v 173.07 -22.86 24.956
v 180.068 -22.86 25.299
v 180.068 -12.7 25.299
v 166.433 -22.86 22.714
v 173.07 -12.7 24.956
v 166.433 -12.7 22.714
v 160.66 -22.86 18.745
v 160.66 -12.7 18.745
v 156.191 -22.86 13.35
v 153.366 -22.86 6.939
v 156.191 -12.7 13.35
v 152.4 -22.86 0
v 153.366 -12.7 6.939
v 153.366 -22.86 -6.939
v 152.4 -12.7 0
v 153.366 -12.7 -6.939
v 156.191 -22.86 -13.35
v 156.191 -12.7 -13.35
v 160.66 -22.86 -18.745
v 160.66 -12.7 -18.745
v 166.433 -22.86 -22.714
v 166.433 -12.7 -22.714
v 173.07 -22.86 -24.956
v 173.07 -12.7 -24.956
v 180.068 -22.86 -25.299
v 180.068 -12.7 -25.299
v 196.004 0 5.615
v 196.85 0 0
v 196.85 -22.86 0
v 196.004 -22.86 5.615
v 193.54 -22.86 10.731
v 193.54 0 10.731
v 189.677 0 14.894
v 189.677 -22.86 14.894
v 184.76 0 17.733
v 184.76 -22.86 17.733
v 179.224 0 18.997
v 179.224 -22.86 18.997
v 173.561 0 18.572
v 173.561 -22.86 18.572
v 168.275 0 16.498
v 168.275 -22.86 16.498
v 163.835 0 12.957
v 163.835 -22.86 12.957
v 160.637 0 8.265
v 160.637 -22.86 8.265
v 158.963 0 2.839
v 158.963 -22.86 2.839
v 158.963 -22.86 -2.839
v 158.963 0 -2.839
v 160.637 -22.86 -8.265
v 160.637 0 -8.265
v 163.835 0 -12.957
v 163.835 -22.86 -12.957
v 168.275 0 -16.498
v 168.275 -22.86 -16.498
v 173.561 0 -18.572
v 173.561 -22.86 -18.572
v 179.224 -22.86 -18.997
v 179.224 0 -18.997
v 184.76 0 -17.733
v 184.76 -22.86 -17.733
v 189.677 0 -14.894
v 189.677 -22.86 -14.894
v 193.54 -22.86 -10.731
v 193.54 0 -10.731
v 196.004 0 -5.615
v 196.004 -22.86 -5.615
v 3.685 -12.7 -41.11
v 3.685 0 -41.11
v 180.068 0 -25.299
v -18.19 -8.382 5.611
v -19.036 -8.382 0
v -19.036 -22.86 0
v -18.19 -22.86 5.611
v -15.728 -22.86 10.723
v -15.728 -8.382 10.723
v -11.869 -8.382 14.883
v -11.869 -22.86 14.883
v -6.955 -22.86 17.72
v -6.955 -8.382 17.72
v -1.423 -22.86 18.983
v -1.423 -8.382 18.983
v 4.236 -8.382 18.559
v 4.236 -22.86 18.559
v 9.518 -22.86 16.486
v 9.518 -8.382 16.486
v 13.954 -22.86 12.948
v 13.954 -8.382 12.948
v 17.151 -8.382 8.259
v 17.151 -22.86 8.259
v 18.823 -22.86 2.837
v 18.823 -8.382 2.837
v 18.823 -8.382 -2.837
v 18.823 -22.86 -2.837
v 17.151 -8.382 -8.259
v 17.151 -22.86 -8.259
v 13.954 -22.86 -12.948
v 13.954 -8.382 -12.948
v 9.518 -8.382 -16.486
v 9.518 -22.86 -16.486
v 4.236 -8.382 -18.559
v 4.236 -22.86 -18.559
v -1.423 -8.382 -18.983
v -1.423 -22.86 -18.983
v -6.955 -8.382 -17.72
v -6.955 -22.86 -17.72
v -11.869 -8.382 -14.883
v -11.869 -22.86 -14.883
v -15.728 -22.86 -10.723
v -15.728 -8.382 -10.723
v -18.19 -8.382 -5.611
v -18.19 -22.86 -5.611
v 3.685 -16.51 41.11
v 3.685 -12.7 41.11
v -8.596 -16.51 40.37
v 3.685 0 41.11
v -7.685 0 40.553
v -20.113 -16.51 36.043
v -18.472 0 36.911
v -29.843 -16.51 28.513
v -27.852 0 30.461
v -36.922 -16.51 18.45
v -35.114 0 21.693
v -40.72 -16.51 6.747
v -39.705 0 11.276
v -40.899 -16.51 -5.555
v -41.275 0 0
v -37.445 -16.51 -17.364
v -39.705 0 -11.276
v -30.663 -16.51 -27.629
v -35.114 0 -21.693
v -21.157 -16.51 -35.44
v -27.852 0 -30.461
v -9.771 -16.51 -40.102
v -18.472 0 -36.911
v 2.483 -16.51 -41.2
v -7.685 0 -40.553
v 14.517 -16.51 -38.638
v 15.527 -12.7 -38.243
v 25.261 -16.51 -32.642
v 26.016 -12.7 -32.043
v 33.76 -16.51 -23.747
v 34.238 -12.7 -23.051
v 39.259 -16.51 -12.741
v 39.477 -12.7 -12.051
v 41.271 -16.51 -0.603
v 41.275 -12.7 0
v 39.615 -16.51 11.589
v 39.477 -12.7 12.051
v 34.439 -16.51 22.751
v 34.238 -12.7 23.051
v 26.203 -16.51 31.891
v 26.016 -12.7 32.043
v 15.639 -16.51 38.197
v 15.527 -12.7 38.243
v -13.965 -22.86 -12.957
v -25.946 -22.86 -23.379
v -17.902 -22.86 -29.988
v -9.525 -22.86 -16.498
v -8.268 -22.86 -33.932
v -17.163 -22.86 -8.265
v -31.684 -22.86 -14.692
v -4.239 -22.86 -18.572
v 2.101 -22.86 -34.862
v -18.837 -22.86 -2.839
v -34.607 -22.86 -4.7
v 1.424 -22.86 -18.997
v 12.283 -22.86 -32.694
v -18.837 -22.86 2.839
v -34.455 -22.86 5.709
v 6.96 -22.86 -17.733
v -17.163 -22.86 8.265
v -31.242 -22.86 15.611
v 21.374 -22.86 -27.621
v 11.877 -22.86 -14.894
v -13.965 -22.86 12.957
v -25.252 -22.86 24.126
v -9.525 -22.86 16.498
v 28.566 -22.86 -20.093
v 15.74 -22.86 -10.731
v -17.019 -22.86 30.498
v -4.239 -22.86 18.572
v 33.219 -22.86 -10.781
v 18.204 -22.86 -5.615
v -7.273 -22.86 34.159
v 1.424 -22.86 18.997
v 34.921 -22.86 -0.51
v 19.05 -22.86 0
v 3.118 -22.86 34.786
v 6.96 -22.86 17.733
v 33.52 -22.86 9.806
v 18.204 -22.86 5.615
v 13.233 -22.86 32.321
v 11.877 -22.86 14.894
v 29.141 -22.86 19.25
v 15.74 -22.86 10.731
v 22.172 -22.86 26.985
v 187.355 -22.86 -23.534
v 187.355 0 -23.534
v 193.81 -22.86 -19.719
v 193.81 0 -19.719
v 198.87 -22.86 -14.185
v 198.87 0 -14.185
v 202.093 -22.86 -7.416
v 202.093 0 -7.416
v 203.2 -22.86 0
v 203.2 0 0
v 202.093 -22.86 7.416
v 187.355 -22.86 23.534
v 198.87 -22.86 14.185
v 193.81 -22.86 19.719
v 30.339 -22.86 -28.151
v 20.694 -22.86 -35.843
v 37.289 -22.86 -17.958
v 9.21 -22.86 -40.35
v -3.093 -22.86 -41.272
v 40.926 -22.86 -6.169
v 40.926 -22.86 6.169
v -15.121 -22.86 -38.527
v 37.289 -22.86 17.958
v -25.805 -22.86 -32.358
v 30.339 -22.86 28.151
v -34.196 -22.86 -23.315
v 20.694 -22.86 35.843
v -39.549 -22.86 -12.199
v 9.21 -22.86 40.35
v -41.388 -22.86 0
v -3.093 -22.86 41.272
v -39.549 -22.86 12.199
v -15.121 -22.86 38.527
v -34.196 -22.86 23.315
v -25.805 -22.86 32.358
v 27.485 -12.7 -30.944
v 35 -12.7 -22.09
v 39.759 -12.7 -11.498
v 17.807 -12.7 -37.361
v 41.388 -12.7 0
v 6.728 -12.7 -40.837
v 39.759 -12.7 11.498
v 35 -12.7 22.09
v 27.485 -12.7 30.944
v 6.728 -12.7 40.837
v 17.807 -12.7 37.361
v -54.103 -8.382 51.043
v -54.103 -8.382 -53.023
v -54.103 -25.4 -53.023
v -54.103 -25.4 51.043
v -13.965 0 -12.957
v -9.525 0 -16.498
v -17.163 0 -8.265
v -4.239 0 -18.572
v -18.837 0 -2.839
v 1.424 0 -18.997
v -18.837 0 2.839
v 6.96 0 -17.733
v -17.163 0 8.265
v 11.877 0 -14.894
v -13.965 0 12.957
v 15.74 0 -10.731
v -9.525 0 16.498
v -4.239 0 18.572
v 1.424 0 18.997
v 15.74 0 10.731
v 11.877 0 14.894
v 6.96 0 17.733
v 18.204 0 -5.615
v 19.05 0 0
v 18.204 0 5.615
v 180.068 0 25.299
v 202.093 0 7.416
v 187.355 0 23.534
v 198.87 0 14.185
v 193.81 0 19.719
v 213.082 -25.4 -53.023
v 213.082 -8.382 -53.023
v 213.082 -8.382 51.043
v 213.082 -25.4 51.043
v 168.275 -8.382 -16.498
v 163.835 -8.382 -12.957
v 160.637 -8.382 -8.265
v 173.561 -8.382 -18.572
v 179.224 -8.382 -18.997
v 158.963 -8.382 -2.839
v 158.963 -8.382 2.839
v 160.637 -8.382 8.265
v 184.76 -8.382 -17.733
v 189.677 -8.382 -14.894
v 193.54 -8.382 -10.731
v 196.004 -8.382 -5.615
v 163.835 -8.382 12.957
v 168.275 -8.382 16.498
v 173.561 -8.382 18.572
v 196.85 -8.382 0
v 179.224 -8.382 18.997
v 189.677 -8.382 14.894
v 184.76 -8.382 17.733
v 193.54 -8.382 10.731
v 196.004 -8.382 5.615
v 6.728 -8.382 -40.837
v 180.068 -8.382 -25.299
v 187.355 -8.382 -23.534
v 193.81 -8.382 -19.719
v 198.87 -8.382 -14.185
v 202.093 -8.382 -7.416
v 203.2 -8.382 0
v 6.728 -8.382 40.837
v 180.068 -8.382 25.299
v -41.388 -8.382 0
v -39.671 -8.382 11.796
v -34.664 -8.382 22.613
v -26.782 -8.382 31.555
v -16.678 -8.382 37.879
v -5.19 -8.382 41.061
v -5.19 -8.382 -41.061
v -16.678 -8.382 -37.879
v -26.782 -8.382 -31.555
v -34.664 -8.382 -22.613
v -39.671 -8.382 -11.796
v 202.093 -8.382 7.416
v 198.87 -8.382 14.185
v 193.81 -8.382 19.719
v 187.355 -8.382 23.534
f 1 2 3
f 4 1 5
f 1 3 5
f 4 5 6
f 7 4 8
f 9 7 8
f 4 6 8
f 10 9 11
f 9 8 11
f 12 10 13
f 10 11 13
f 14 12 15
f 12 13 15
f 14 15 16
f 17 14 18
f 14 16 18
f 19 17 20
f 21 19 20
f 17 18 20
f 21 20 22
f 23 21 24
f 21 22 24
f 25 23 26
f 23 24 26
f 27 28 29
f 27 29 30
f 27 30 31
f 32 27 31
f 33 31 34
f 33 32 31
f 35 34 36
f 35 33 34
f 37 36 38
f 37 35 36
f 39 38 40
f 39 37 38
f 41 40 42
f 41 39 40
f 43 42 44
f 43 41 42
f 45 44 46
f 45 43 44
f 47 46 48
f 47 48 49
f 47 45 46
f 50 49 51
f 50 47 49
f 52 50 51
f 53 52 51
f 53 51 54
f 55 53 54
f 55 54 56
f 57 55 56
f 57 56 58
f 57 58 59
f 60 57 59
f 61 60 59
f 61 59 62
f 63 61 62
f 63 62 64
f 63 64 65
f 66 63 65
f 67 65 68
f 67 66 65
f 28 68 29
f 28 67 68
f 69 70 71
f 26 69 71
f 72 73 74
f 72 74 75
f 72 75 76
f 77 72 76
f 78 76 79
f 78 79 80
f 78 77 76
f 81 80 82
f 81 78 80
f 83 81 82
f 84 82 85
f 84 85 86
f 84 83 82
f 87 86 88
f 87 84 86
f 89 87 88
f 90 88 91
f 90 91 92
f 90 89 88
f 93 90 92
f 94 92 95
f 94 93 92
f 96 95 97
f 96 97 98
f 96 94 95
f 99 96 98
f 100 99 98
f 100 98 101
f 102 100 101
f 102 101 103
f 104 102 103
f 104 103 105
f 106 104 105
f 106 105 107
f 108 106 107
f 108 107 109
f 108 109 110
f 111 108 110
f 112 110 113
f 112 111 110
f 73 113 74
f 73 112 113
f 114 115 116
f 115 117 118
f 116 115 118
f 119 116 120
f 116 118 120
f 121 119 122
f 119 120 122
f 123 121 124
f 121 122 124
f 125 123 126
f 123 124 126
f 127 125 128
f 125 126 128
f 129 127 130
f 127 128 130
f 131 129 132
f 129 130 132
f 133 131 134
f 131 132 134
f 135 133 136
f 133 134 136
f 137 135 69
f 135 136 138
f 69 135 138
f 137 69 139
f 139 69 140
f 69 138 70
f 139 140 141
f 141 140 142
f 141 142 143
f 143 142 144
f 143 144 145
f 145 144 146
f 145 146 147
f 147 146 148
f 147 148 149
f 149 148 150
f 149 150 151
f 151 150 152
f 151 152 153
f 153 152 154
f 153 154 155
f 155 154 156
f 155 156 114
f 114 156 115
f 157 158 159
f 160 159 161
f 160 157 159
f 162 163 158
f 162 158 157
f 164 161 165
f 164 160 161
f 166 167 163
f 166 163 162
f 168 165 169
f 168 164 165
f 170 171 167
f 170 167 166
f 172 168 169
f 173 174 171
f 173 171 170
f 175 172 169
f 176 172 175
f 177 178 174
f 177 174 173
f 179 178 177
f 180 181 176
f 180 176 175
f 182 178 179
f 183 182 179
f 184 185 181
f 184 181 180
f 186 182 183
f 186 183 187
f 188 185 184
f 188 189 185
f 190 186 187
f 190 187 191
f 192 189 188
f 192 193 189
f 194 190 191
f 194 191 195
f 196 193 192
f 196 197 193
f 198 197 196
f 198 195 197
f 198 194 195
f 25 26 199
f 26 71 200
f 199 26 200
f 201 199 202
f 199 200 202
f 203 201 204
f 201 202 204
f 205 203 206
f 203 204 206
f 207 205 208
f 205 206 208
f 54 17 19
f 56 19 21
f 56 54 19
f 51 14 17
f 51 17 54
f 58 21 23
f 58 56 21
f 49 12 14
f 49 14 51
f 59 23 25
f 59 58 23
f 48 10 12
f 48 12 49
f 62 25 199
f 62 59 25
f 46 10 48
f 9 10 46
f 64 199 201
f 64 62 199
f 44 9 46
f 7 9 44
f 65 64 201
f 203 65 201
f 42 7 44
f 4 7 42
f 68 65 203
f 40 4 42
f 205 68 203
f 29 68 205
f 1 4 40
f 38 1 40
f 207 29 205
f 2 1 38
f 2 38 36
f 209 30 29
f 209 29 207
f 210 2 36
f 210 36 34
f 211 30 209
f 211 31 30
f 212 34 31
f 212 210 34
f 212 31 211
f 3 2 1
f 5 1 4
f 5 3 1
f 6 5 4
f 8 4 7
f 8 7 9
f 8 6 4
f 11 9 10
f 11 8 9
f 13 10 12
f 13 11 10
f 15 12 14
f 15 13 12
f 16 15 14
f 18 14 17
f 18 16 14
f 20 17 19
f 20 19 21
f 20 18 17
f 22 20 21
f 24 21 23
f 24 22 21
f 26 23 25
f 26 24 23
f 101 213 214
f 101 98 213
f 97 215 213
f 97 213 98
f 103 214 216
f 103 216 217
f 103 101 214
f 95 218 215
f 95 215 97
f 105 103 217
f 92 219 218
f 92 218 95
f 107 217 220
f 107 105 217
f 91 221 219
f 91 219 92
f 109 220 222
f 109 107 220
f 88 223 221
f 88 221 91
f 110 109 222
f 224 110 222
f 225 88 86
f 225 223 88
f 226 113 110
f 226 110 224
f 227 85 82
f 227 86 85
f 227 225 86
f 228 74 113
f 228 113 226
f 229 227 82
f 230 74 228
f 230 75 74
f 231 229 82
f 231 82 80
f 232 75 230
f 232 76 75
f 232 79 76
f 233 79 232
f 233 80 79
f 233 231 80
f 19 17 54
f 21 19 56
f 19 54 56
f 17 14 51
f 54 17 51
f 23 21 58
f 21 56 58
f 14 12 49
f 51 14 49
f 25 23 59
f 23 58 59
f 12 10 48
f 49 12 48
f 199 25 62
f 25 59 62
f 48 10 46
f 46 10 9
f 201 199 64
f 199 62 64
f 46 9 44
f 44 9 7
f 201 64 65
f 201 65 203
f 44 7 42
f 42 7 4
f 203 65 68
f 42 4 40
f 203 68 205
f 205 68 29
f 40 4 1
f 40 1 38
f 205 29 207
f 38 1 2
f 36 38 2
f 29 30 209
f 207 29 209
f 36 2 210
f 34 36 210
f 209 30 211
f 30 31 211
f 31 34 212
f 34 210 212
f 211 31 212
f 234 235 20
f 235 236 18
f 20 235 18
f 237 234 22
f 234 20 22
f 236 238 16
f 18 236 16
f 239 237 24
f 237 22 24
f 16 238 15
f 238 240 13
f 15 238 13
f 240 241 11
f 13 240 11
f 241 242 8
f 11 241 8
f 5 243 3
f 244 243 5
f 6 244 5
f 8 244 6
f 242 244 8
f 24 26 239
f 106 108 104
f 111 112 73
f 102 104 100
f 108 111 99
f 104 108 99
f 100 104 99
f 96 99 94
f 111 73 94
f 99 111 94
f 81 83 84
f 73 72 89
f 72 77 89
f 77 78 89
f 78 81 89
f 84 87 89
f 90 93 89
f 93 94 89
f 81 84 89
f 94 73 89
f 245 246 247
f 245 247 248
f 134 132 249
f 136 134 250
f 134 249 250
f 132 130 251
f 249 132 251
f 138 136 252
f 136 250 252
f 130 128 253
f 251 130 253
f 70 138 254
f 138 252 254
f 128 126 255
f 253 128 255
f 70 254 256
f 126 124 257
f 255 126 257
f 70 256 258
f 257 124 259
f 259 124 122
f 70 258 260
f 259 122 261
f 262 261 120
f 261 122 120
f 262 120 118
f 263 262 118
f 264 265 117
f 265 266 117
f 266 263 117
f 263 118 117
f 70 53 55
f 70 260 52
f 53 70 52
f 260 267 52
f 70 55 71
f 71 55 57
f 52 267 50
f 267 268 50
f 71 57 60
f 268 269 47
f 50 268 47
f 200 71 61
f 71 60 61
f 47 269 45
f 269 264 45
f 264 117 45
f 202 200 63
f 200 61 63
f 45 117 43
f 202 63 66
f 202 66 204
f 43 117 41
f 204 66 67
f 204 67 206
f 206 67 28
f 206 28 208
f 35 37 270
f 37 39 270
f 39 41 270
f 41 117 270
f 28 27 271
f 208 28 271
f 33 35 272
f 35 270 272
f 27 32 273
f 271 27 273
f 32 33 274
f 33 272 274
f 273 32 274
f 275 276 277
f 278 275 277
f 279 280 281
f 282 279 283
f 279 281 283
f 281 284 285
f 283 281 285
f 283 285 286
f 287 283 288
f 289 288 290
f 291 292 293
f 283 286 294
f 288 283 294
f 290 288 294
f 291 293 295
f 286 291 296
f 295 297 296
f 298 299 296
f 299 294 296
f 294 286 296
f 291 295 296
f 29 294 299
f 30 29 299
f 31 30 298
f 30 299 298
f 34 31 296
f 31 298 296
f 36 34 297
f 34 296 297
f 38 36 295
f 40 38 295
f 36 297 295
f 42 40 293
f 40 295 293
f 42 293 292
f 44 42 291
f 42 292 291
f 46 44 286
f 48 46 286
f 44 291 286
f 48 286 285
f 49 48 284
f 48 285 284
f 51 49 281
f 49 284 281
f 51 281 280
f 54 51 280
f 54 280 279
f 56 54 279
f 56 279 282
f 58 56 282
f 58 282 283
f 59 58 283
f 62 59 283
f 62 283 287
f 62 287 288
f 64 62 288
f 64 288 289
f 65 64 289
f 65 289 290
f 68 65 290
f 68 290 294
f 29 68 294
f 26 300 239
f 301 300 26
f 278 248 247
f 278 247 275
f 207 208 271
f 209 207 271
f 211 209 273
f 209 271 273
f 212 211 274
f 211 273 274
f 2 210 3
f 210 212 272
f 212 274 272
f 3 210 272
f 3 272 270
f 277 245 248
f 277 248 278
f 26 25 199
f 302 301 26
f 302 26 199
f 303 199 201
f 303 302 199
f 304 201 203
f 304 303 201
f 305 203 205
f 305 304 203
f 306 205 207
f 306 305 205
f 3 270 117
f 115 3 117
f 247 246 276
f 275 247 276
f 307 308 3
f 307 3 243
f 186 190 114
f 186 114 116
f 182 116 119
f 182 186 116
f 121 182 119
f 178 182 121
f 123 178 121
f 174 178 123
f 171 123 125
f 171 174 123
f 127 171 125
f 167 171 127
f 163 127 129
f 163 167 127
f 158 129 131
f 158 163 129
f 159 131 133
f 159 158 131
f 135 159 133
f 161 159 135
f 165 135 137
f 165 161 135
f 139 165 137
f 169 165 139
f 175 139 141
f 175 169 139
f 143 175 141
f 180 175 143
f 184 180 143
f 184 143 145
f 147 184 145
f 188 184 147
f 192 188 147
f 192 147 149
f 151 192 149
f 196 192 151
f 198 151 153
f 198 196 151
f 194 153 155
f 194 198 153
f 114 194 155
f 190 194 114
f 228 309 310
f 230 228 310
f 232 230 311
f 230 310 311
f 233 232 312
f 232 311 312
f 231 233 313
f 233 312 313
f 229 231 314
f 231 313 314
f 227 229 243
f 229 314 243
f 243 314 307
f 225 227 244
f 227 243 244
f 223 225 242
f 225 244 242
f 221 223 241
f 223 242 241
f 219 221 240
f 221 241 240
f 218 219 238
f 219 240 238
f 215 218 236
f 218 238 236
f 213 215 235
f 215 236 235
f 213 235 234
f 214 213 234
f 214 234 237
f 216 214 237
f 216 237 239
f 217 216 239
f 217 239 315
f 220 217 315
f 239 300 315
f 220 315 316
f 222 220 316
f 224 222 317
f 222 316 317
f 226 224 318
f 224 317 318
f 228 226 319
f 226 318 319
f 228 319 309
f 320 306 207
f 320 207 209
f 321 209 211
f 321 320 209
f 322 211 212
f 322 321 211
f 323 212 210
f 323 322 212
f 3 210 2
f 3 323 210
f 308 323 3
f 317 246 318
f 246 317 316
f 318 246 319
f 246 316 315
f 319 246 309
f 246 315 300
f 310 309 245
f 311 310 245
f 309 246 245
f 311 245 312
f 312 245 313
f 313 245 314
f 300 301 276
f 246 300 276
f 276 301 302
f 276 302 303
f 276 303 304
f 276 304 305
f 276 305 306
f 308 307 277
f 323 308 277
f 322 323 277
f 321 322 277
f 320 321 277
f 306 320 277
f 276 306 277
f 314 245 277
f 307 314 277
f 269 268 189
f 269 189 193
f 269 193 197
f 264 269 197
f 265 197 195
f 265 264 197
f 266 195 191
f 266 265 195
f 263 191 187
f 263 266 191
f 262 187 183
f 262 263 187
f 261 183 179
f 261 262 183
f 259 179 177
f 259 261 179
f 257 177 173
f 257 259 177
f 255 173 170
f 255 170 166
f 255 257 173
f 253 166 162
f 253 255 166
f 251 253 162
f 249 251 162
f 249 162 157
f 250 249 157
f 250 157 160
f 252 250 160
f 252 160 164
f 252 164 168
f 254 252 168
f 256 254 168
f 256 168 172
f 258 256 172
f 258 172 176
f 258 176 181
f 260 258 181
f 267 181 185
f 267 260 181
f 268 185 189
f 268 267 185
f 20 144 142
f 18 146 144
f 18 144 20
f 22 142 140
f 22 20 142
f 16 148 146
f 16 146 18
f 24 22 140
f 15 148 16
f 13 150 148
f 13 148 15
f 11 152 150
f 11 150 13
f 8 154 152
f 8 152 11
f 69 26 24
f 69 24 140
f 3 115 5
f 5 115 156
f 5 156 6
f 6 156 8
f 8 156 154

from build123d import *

# Parameters (mm, degrees)
F1_DEPTH = 12.7
F0_R     = 19.05
F2_DEPTH = 22.86
F3_SIZE  = 6.35
F5_START = 8.382
F4_W     = 267.1855464578
F4_H     = 104.0655337274
F5_DEPTH = 17.018
F7_R     = 41.3878634572
F7_R_2   = 19.0358650016
F8_DEPTH = 14.478


with BuildPart() as f1:
    # F0 (on Front) → F1 (new body)
    with BuildSketch(Plane.XZ):
        with BuildLine():
            ThreePointArc((3.6852678571, 41.1101499124), (30.460918041, 27.8524343119), (41.275, 0))
            ThreePointArc((41.275, 0), (30.460918041, -27.8524343119), (3.6852678571, -41.1101499124))
            Line((3.6852678571, -41.1101499124), (180.0678571429, -25.2985537923))
            ThreePointArc((180.0678571429, -25.2985537923), (152.4, 0), (180.0678571429, 25.2985537923))
            Line((180.0678571429, 25.2985537923), (3.6852678571, 41.1101499124))
        make_face()
    extrude(amount=F1_DEPTH)

    # F0 (on Front) → F2 (join)
    with BuildSketch(Plane.XZ):
        with BuildLine():
            ThreePointArc((3.6852678571, -41.1101499124), (30.460918041, -27.8524343119), (41.275, 0))
            ThreePointArc((41.275, 0), (30.460918041, 27.8524343119), (3.6852678571, 41.1101499124))
            ThreePointArc((3.6852678571, 41.1101499124), (-41.275, 0), (3.6852678571, -41.1101499124))
        make_face()
        Circle(F0_R, mode=Mode.SUBTRACT)
        with BuildLine():
            ThreePointArc((203.2, 0), (196.5451803329, 17.1399595765), (180.0678571429, 25.2985537923))
            ThreePointArc((180.0678571429, 25.2985537923), (152.4, 0), (180.0678571429, -25.2985537923))
            ThreePointArc((180.0678571429, -25.2985537923), (196.5451803329, -17.1399595765), (203.2, 0))
        make_face()
        with Locations((177.8, 0)):
            Circle(F0_R, mode=Mode.SUBTRACT)
    extrude(amount=F2_DEPTH)

    # F3
    f3_edges = [f1.edges().sort_by_distance(p)[0] for p in [
        (-41.275, -22.86, 0),
    ]]
    chamfer(f3_edges, length=F3_SIZE)


with BuildPart() as f5:
    # F4 (on Front) → F5 (new body)
    with BuildSketch(Plane.XZ.offset(F5_START)):
        with Locations((79.4894956052, -0.9902436286)):
            Rectangle(F4_W, F4_H)
    extrude(amount=F5_DEPTH)

    # F6: cut F1
    add(f1.part, mode=Mode.SUBTRACT)

    # F7 (on face) → F8 (cut, through all)
    with BuildSketch(Plane(origin=(0, -8.382, 0), x_dir=(-1, 0, 0), z_dir=(0, 1, 0))):
        Circle(F7_R)
        Circle(F7_R_2, mode=Mode.SUBTRACT)
    extrude(amount=-F8_DEPTH, mode=Mode.SUBTRACT)


solid = Compound([f1.part, f5.part])
